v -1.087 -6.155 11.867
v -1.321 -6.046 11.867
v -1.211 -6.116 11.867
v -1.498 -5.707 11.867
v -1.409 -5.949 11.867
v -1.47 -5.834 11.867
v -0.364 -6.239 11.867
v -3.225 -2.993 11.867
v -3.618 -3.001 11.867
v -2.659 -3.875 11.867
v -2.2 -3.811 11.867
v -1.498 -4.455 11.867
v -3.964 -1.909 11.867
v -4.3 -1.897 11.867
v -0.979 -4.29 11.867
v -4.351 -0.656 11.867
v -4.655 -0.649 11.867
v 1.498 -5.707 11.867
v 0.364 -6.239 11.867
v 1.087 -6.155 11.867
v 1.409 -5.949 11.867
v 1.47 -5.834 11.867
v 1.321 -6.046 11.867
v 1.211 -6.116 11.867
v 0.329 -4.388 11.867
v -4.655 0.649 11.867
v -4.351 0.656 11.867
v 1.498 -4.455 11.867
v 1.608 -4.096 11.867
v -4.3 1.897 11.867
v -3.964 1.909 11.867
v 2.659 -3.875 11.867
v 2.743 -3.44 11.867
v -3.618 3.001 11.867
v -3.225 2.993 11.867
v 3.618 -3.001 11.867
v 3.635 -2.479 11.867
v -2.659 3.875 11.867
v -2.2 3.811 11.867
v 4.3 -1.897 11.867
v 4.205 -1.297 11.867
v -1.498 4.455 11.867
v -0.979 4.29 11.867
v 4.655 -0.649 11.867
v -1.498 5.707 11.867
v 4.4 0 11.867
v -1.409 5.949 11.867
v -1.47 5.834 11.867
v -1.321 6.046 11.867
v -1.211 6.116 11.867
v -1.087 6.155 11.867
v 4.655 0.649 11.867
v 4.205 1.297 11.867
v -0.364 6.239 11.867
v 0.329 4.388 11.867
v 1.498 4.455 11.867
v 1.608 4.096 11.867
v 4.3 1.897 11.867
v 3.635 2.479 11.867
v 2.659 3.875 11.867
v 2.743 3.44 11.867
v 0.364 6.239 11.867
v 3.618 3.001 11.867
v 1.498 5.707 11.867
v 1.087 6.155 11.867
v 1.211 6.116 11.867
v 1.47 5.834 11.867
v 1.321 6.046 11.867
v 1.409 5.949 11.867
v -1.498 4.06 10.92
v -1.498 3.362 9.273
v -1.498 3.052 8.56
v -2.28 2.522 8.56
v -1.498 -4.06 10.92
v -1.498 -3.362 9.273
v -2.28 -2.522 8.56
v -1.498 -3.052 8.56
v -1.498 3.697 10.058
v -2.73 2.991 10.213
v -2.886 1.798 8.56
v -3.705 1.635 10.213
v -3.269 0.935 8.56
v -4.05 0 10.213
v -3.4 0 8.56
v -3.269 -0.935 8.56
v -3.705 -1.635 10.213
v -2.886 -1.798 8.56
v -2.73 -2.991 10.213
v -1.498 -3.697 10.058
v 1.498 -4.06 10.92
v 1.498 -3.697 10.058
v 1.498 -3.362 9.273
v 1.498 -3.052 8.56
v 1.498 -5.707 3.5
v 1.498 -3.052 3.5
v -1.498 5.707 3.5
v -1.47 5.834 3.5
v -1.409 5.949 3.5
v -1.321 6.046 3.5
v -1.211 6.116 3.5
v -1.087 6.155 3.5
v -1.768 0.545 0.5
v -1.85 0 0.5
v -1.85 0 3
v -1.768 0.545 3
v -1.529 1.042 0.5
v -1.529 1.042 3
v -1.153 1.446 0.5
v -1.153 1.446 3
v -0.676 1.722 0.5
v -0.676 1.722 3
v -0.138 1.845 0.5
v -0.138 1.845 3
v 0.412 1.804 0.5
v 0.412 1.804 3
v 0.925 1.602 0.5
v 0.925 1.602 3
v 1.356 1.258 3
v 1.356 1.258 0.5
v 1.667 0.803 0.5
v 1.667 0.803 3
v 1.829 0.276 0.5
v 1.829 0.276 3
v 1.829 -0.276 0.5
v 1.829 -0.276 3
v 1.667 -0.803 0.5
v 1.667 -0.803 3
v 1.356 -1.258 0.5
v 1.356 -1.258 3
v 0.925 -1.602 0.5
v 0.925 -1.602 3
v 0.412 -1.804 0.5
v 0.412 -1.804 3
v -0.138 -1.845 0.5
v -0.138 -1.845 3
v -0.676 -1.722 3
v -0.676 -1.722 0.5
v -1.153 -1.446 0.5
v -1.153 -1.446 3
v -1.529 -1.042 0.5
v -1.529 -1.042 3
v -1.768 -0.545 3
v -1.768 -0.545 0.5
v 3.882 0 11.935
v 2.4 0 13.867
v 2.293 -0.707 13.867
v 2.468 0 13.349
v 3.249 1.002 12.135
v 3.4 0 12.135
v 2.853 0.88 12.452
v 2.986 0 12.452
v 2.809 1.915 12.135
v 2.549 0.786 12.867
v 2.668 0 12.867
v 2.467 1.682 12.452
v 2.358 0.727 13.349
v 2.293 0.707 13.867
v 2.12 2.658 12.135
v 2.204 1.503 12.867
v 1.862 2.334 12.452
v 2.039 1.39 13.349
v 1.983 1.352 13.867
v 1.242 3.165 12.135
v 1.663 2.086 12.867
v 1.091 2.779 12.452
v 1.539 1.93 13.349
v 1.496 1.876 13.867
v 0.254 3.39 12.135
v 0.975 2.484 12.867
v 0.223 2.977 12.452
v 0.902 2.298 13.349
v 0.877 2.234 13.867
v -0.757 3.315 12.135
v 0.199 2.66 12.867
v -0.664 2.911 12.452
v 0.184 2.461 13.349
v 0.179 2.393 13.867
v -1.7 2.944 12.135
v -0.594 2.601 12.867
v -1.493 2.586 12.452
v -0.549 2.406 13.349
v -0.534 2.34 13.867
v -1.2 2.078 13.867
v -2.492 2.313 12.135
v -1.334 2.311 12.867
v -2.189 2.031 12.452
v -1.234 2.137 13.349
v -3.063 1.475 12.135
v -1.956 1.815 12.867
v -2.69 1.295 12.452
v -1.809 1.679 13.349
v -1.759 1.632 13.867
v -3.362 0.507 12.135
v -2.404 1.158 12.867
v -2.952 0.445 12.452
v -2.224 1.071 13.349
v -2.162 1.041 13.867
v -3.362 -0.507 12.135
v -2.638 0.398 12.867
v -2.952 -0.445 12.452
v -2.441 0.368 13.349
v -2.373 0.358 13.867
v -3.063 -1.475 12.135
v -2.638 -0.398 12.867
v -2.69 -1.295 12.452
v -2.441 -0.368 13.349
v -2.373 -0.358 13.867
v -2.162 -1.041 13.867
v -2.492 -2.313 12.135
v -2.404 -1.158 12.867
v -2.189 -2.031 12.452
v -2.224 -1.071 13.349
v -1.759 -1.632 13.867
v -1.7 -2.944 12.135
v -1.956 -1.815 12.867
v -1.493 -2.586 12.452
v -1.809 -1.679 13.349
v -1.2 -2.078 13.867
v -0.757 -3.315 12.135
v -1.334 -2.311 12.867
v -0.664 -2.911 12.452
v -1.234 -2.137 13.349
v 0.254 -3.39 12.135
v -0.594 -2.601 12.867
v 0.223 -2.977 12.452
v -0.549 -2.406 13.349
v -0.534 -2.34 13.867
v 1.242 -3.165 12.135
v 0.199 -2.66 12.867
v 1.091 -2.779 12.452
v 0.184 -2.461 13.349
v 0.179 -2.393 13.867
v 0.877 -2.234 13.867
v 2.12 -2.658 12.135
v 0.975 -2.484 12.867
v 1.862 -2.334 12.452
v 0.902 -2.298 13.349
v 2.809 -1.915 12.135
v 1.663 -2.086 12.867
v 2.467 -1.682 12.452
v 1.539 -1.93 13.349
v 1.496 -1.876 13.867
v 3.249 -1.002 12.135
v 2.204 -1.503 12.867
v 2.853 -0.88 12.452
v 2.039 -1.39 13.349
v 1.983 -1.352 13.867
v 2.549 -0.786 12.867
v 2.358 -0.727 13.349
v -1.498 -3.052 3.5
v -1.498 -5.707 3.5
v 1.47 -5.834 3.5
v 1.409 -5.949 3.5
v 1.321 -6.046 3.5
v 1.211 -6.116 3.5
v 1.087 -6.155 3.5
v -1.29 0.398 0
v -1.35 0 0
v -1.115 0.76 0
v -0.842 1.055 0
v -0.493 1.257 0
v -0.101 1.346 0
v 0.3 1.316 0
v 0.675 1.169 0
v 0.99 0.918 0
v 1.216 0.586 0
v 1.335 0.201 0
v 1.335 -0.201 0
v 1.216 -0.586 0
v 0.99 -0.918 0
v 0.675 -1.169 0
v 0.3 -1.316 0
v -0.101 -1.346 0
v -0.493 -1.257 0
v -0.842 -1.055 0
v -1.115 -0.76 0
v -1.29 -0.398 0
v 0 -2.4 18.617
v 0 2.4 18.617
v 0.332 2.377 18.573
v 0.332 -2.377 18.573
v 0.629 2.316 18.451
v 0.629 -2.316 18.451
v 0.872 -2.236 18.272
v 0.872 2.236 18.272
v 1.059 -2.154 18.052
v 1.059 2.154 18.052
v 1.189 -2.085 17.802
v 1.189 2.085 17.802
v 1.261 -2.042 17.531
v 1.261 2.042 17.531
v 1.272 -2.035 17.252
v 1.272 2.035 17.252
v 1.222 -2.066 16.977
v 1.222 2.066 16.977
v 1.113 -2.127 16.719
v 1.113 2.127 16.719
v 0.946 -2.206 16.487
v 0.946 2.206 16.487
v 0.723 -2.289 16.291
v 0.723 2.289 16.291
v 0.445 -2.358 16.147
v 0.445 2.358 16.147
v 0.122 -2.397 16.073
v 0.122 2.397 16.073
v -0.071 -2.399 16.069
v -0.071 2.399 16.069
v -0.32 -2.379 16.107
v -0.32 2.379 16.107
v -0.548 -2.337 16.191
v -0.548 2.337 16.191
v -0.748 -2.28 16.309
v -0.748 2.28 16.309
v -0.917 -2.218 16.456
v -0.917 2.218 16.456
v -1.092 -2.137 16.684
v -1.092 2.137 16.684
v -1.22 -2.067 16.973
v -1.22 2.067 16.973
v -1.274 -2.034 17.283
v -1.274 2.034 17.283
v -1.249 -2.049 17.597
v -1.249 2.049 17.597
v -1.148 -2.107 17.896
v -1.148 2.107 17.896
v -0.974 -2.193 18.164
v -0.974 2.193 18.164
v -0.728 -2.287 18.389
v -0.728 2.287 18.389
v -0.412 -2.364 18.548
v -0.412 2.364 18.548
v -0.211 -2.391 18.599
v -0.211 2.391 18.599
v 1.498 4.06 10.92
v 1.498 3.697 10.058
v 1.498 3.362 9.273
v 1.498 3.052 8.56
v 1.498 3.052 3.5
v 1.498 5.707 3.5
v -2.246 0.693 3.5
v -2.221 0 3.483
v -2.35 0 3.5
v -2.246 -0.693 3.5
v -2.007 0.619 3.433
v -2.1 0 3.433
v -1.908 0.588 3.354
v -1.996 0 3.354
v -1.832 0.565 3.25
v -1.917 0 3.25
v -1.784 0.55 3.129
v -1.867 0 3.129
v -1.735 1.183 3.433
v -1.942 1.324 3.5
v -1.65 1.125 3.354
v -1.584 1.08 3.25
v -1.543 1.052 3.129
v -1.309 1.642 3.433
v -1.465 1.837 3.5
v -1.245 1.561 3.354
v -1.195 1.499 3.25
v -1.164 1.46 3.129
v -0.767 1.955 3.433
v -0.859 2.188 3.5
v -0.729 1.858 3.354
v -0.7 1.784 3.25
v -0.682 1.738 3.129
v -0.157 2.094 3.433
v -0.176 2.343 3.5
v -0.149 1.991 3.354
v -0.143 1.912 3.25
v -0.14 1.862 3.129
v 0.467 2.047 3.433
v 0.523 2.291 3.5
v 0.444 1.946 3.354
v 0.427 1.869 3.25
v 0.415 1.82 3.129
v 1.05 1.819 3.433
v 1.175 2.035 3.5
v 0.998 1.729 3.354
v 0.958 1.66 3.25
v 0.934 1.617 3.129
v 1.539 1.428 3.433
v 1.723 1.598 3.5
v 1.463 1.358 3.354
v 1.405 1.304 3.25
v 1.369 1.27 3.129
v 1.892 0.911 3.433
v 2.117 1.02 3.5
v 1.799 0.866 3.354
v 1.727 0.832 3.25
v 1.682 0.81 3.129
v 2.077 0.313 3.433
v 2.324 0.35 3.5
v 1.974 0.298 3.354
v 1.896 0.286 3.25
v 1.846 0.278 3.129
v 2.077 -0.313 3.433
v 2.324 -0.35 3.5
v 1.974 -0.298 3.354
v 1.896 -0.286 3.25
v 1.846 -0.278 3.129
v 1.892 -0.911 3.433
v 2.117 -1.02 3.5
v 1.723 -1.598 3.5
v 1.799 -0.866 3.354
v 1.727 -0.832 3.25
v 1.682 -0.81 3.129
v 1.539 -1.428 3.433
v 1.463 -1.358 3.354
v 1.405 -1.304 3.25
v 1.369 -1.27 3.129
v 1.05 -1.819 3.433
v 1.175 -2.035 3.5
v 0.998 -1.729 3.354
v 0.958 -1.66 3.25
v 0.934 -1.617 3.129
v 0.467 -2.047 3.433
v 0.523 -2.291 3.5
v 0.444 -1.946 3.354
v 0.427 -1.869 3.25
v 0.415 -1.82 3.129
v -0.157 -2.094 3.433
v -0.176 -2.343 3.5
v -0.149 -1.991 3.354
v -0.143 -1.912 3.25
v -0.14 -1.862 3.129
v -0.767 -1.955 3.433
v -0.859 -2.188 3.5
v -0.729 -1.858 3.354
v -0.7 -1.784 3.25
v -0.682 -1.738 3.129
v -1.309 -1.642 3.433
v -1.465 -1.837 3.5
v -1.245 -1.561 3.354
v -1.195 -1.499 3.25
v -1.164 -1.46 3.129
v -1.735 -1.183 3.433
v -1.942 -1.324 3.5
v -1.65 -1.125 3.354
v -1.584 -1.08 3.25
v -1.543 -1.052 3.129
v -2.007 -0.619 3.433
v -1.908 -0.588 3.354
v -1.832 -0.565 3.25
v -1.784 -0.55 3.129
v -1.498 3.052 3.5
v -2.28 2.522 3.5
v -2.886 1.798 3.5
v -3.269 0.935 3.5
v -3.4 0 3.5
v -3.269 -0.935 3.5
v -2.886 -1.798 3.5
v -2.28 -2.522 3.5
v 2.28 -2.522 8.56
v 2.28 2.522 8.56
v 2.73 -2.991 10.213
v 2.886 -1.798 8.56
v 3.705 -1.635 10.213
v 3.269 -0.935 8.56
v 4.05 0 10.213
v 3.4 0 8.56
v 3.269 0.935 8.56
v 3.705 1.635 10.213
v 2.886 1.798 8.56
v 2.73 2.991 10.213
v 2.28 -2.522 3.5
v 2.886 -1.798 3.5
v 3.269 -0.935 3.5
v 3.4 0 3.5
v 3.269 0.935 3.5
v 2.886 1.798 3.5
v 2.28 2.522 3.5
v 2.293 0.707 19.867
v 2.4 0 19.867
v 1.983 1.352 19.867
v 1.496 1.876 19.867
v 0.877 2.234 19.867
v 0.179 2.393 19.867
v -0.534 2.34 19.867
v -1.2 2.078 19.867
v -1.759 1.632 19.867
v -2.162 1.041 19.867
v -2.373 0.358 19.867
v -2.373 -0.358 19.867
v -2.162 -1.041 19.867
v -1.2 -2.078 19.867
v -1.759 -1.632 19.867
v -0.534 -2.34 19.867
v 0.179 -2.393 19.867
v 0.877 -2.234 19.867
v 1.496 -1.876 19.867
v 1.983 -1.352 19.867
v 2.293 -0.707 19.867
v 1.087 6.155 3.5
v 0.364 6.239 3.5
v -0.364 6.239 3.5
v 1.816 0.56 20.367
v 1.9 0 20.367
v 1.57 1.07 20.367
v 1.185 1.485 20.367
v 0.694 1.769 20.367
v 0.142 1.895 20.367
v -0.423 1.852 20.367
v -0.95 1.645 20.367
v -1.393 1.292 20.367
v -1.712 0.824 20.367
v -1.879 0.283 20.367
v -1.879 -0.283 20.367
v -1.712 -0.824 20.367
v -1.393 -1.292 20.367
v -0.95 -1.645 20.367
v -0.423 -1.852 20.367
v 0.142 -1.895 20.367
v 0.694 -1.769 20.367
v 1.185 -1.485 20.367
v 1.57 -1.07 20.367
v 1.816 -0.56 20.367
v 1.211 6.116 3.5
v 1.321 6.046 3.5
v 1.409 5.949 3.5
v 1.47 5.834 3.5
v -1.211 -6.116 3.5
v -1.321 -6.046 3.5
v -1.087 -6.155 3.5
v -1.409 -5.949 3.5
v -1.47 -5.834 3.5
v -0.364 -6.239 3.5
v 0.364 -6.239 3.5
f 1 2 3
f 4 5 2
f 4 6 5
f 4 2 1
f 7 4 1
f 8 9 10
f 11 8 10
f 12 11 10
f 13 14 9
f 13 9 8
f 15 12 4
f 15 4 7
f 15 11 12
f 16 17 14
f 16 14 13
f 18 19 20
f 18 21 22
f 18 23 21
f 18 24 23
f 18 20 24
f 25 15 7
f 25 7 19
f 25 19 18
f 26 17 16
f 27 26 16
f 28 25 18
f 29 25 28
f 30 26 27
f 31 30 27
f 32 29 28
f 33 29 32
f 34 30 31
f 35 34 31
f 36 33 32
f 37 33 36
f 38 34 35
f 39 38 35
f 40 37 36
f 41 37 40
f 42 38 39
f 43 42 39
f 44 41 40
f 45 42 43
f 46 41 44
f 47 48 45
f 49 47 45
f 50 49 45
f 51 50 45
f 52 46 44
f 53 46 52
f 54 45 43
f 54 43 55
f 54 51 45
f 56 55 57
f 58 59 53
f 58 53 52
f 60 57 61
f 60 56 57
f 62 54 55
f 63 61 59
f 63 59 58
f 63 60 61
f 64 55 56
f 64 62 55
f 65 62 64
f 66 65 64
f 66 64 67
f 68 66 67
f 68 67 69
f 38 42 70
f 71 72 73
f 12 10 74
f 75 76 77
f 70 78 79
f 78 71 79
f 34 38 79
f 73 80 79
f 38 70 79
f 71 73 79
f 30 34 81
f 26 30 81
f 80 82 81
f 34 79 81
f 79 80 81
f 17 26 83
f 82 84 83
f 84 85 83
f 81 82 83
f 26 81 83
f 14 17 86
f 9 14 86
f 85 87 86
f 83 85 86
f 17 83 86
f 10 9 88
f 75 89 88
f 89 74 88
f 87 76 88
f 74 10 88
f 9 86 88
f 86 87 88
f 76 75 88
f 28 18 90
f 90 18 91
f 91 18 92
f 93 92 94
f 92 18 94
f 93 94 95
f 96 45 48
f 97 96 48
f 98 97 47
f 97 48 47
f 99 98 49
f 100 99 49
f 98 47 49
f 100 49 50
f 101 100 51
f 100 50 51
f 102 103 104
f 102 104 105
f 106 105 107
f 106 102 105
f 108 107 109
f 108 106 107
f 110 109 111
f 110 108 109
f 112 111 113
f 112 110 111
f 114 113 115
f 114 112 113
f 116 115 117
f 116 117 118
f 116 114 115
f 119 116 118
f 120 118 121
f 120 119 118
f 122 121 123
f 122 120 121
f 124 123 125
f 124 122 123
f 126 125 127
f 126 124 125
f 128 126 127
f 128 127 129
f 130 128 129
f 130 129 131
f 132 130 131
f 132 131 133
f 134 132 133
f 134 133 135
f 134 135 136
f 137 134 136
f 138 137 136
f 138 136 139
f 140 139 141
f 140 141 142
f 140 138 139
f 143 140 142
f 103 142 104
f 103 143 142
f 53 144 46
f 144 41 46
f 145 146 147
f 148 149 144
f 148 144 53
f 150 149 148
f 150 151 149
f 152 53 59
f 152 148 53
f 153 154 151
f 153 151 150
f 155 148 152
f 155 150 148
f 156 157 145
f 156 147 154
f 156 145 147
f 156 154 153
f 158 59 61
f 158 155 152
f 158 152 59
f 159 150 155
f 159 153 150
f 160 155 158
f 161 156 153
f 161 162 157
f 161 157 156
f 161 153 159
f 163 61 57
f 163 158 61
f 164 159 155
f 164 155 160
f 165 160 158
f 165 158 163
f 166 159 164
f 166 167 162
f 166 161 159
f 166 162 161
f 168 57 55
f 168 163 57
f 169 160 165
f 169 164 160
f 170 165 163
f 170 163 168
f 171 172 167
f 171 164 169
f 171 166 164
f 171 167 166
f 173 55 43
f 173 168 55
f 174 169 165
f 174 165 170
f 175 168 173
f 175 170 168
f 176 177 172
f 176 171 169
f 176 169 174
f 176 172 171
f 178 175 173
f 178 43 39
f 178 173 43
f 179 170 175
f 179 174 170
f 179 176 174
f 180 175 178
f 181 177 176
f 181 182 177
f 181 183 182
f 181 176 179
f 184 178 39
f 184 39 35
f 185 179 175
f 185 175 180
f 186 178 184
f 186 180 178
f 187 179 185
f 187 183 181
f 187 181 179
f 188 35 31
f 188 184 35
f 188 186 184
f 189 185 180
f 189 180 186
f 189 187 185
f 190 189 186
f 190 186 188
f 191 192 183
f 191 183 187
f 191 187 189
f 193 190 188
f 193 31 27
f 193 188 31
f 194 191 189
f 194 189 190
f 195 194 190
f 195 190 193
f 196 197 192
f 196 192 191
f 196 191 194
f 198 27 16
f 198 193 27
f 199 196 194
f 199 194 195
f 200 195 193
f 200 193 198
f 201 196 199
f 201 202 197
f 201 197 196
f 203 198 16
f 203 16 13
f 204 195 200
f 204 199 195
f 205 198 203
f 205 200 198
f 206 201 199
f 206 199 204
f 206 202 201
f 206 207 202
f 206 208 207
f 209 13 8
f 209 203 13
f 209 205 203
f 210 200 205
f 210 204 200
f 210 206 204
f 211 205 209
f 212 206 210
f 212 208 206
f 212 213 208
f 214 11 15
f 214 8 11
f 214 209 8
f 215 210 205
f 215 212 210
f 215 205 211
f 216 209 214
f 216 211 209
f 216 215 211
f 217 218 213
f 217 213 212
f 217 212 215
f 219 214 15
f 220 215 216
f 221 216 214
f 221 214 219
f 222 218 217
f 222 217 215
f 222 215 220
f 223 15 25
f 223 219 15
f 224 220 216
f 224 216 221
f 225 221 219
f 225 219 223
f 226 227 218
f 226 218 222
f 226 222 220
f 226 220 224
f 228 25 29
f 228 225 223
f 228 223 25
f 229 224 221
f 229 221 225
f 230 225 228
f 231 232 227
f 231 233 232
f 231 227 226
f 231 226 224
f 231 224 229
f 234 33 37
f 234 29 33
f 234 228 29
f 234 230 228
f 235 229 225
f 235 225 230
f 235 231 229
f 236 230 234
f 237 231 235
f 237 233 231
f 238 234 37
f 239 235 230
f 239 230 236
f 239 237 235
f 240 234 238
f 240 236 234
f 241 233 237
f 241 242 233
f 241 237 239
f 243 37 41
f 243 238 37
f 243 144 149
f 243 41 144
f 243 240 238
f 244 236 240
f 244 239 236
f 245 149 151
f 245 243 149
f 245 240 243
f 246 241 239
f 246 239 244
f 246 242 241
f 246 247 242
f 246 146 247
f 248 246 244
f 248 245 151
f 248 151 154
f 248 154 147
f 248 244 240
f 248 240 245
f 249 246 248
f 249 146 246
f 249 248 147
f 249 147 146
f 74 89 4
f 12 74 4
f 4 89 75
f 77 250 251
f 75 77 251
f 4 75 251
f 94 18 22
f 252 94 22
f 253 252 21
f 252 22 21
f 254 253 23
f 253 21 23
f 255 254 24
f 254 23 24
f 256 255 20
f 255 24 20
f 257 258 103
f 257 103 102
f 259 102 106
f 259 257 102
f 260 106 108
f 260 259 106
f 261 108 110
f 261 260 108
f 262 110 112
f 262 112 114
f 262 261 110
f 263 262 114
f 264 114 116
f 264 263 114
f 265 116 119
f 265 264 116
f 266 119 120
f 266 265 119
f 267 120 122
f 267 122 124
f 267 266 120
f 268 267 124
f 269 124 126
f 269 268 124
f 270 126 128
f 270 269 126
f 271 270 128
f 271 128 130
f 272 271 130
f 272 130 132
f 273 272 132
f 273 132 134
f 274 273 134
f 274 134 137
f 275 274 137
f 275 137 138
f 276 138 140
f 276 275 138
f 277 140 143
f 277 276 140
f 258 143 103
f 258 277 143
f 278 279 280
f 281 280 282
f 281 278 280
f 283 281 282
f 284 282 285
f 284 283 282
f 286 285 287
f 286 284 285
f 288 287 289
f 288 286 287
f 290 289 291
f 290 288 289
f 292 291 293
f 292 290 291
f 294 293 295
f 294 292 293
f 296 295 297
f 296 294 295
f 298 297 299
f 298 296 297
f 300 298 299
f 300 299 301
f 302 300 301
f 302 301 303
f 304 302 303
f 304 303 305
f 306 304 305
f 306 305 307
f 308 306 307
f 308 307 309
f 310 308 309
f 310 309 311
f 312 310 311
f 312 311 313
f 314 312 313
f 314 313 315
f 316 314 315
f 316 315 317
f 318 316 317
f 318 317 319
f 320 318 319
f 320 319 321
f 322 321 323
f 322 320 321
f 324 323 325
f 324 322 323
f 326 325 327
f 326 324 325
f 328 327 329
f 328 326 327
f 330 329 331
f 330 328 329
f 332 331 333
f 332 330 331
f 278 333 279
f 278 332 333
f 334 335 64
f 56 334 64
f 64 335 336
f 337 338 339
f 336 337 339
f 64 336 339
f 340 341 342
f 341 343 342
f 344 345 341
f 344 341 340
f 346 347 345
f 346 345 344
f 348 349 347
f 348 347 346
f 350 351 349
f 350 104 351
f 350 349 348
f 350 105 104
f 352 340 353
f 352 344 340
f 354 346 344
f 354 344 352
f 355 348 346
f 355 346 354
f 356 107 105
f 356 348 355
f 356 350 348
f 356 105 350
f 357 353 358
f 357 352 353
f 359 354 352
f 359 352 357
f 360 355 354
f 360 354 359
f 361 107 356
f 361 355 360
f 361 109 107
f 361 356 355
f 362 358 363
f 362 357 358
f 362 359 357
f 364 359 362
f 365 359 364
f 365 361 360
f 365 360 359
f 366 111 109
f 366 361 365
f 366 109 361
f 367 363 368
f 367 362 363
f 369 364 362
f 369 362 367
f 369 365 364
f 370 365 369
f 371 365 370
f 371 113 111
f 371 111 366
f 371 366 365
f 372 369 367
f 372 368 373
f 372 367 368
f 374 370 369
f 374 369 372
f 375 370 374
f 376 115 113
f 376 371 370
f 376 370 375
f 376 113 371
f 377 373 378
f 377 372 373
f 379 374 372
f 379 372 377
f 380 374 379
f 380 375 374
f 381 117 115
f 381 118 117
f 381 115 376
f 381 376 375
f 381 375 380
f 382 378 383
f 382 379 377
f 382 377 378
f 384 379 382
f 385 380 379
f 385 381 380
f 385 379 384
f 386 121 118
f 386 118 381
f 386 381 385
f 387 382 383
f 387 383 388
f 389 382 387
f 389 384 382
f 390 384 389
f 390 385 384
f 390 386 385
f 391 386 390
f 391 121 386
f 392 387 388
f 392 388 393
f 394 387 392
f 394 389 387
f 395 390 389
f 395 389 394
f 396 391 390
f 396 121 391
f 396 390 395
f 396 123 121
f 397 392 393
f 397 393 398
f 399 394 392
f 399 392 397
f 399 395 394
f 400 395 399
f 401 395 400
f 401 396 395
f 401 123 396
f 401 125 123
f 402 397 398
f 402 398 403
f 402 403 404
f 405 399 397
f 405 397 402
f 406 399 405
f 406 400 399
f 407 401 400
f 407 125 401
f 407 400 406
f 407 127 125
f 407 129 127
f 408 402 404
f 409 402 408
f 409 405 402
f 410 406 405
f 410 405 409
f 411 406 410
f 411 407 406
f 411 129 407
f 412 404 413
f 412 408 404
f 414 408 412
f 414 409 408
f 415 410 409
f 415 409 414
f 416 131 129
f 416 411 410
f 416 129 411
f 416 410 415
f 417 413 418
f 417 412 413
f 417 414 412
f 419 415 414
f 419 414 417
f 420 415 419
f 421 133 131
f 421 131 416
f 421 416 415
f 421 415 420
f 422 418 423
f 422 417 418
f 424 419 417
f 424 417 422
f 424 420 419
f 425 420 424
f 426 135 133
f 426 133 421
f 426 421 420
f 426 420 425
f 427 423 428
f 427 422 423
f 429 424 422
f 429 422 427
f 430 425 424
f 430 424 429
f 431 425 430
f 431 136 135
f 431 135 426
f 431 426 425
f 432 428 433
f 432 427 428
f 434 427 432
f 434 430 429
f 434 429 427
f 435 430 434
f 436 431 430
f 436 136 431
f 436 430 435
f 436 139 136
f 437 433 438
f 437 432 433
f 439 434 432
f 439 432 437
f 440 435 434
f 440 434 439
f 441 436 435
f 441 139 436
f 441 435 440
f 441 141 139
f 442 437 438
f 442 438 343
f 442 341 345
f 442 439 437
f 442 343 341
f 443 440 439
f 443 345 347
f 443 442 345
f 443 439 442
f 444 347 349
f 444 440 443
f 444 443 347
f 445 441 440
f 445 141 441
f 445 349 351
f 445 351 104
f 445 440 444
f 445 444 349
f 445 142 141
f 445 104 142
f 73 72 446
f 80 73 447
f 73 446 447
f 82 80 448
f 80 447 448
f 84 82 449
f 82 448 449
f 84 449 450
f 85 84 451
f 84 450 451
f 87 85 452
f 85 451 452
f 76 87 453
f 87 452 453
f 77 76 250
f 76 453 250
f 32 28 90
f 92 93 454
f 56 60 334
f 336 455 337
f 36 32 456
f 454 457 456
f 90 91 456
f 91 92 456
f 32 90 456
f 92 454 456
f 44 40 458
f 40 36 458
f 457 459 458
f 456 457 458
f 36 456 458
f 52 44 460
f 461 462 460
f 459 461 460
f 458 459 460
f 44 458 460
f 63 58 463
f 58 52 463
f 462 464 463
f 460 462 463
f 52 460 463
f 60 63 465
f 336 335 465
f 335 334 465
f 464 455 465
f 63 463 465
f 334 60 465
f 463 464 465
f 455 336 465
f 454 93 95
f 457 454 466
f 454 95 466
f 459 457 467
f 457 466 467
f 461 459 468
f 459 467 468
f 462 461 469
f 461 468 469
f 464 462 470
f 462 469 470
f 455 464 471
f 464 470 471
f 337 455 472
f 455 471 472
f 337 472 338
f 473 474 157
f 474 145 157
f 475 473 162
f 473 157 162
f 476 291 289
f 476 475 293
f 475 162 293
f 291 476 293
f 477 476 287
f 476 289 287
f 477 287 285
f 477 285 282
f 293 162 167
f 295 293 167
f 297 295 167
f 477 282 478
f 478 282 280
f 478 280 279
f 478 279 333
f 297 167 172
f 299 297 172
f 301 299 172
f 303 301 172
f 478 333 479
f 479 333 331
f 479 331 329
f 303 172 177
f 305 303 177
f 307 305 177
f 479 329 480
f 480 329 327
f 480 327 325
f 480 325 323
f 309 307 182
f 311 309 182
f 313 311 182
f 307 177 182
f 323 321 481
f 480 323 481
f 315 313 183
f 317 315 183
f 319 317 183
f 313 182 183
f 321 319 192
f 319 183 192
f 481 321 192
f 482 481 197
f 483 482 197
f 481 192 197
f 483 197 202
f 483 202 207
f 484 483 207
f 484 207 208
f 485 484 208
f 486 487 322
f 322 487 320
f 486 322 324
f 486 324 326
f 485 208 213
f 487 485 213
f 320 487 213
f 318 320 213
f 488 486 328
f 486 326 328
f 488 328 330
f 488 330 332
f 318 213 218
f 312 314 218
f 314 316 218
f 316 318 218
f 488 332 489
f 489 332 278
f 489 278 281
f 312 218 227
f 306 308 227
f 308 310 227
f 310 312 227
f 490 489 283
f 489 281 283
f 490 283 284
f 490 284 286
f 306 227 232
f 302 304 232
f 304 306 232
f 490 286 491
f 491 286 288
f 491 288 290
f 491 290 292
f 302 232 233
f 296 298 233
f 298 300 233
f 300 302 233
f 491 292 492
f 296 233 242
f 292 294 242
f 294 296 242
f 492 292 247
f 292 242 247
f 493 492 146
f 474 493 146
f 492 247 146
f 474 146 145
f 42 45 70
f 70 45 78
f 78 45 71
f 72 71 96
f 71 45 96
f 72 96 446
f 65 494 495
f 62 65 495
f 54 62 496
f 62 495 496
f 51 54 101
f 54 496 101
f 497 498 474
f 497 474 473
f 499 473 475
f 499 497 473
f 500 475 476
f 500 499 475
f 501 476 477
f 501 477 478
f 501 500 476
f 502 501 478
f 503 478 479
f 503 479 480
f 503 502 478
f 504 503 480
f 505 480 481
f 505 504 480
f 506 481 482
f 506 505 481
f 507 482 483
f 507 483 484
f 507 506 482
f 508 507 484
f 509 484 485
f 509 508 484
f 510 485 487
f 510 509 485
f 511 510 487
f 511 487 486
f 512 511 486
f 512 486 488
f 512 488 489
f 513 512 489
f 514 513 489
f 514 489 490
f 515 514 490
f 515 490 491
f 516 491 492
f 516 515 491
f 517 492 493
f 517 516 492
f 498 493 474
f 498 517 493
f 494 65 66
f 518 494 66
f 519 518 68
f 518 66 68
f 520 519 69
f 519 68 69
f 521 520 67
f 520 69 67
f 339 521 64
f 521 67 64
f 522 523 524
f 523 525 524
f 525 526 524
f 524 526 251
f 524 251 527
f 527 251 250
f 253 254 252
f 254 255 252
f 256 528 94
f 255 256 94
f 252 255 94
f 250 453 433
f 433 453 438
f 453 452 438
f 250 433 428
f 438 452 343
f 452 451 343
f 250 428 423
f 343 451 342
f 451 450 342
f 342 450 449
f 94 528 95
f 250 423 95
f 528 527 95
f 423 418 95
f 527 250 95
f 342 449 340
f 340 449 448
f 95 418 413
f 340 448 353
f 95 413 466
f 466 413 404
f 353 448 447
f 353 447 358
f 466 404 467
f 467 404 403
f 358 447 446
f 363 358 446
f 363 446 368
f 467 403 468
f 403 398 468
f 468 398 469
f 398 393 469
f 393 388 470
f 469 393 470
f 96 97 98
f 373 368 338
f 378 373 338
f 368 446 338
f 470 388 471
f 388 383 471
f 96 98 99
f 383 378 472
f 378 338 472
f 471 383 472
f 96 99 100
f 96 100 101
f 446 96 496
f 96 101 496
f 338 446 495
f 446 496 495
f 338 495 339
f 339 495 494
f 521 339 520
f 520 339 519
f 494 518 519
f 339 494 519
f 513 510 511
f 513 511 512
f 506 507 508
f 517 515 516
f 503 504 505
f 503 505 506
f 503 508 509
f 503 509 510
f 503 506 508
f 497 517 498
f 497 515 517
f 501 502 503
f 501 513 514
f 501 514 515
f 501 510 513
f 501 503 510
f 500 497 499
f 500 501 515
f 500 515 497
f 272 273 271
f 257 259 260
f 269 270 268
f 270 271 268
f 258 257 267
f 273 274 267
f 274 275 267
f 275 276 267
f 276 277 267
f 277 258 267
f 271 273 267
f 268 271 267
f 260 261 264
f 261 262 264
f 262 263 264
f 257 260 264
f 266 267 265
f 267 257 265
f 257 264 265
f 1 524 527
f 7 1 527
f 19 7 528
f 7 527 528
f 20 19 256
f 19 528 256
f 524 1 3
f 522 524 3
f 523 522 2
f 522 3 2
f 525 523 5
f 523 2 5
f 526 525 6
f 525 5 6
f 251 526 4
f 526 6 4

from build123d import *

# Parameters (mm, degrees)
SKETCH1_R               = 4.7
BOSS_EXTRUDE1_DEPTH     = 11.866666667
SKETCH2_OUTSIDE_W       = 14.964
SKETCH2_OUTSIDE_H       = 14.964
SKETCH2_OUTSIDE_R       = 1.85
CUT_EXTRUDE1_DEPTH      = 3.5
BOSS_EXTRUDE2_START     = -8.366666667
BOSS_EXTRUDE2_DEPTH     = 8.366666667
FILLET1_R               = 0.5
FILLET2_R               = 0.5
SKETCH4_R               = 2.4
BOSS_EXTRUDE3_DEPTH     = 8.5
FILLET3_R               = 2
CHAMFER1_SIZE           = 0.5
CUT_EXTRUDE2_DEPTH      = 22.816361088
CUT_EXTRUDE2_DEPTH_BACK = 22.816361088
SKETCH5_R               = 1.275
BOSS_EXTRUDE4_START     = 3.5
BOSS_EXTRUDE4_DEPTH     = 8.366666667


# Read off the part's stored shape, not the designer's step: Boss-Extrude4
with BuildPart() as part:
    # Sketch1 → Boss-Extrude1 (new body)
    with BuildSketch(Plane.XY):
        Circle(SKETCH1_R)
    extrude(amount=BOSS_EXTRUDE1_DEPTH)

    # Sketch2 outside → Cut-Extrude1 (cut)
    with BuildSketch(Plane(origin=(0, 0, 0), x_dir=(-1, 0, 0), z_dir=(0, 0, -1))):
        Rectangle(SKETCH2_OUTSIDE_W, SKETCH2_OUTSIDE_H)
        Circle(SKETCH2_OUTSIDE_R, mode=Mode.SUBTRACT)
    extrude(amount=-CUT_EXTRUDE1_DEPTH, mode=Mode.SUBTRACT)

    # Sketch3 → Boss-Extrude2 (add)
    with BuildSketch(Plane.XY.offset(11.866666667).offset(BOSS_EXTRUDE2_START)):
        with BuildLine():
            Line((-1.5, 6.06733055), (-1.5, 4.45421149))
            ThreePointArc((-1.5, 4.45421149), (0, 4.7), (1.5, 4.45421149))
            Line((1.5, 4.45421149), (1.5, 6.06733055))
            ThreePointArc((1.5, 6.06733055), (0, 6.25), (-1.5, 6.06733055))
        make_face()
        with BuildLine():
            ThreePointArc((1.5, -4.45421149), (0, -4.7), (-1.5, -4.45421149))
            Line((-1.5, -4.45421149), (-1.5, -6.06733055))
            ThreePointArc((-1.5, -6.06733055), (0, -6.25), (1.5, -6.06733055))
            Line((1.5, -6.06733055), (1.5, -4.45421149))
        make_face()
    extrude(amount=BOSS_EXTRUDE2_DEPTH)

    # Fillet1
    fillet1_edges = [part.edges().sort_by_distance(p)[0] for p in [
        (-1.5, 6.06733055, 7.683333333),
        (-1.5, 4.45421149, 7.683333333),
        (1.5, 4.45421149, 7.683333333),
        (1.5, 6.06733055, 7.683333333),
        (1.5, -6.06733055, 7.683333333),
        (1.5, -4.45421149, 7.683333333),
        (-1.5, -4.45421149, 7.683333333),
        (-1.5, -6.06733055, 7.683333333),
    ]]
    fillet(fillet1_edges, radius=FILLET1_R)

    # Fillet2
    fillet2_edges = [part.edges().sort_by_distance(p)[0] for p in [
        (1.85, 0, 3.5),
    ]]
    fillet(fillet2_edges, radius=FILLET2_R)

    # Sketch4 → Boss-Extrude3 (add)
    with BuildSketch(Plane.XY.offset(11.866666667)):
        Circle(SKETCH4_R)
    extrude(amount=BOSS_EXTRUDE3_DEPTH)

    # Fillet3
    fillet3_edges = [part.edges().sort_by_distance(p)[0] for p in [
        (-2.4, 0, 11.866666667),
    ]]
    fillet(fillet3_edges, radius=FILLET3_R)

    # Chamfer1
    chamfer1_edges = [part.edges().sort_by_distance(p)[0] for p in [
        (-2.4, 0, 20.366666667),
        (1.85, 0, 0),
    ]]
    chamfer(chamfer1_edges, length=CHAMFER1_SIZE)

    # Sketch5 → Cut-Extrude2 (cut, two sides: drawn at the far end of the back side and taken through both)
    with BuildSketch(Plane(origin=(0, 0, 0), x_dir=(1, 0, 0), z_dir=(0, 1, 0)).offset(-CUT_EXTRUDE2_DEPTH_BACK)):
        with Locations(Location((0, -17.341666667, 0), (0, 0, 270))):
            Circle(SKETCH5_R)
    extrude(amount=CUT_EXTRUDE2_DEPTH + CUT_EXTRUDE2_DEPTH_BACK, mode=Mode.SUBTRACT)

    # Sketch6 → Cut-Revolve1 (revolve, cut)
    with BuildSketch(Plane(origin=(0, 0, 0), x_dir=(1, 0, 0), z_dir=(0, 1, 0)), mode=Mode.PRIVATE) as cut_revolve1_sk:
        Polygon((-4.7, -3.5), (-5.9, -3.5), (-5.9, -11.866666667), (-4.7, -11.866666667), (-3.4, -8.55965578), (-3.4, -3.5), align=None)
    revolve(cut_revolve1_sk.sketch.rotate(Axis((0, 0, 0), (0, 0, 1)), 180), axis=Axis((0, 0, 0), (0, 0, 1)), mode=Mode.SUBTRACT)


with BuildPart() as cut_revolve1_piece_1:
    # of the separate pieces the step leaves, piece 1, a body of its own (cut_revolve1_pieces)
    add(part.part.solids().sort_by_distance((2.4, 0, 19.866666667))[0])



with BuildPart() as cut_revolve1_piece_2:
    # of the separate pieces the step leaves, piece 2, a body of its own (cut_revolve1_pieces)
    add(part.part.solids().sort_by_distance((1.498035668, 5.706653059, 11.866666667))[0])


with BuildPart() as cut_revolve1_piece_3:
    # of the separate pieces the step leaves, piece 3, a body of its own (cut_revolve1_pieces)
    add(part.part.solids().sort_by_distance((1.498035668, -5.706653059, 11.866666667))[0])


with BuildPart() as cut_revolve1_piece_1_1:
    add(cut_revolve1_piece_1.part)

    add(cut_revolve1_piece_2.part)  # Boss-Extrude4 merges Cut-Revolve1 piece 2

    add(cut_revolve1_piece_3.part)  # Boss-Extrude4 merges Cut-Revolve1 piece 3
    # Boss-Extrude4 outline → Boss-Extrude4 (add)
    with BuildSketch(Plane.XY.offset(BOSS_EXTRUDE4_START)):
        with BuildLine():
            ThreePointArc((-1.498035668, -5.706653059), (0, -5.9), (1.498035668, -5.706653059))
            Line((1.498035668, -5.706653059), (1.498035668, -3.052194151))
            ThreePointArc((1.498035668, -3.052194151), (0, -3.4), (-1.498035668, -3.052194151))
            Line((-1.498035668, -3.052194151), (-1.498035668, -5.706653059))
        make_face()
        with BuildLine():
            Line((-1.498035668, 5.706653059), (-1.498035668, 3.052194151))
            ThreePointArc((-1.498035668, 3.052194151), (0, 3.4), (1.498035668, 3.052194151))
            Line((1.498035668, 3.052194151), (1.498035668, 5.706653059))
            ThreePointArc((1.498035668, 5.706653059), (0, 5.9), (-1.498035668, 5.706653059))
        make_face()
    extrude(amount=BOSS_EXTRUDE4_DEPTH)


solid = cut_revolve1_piece_1_1.part
